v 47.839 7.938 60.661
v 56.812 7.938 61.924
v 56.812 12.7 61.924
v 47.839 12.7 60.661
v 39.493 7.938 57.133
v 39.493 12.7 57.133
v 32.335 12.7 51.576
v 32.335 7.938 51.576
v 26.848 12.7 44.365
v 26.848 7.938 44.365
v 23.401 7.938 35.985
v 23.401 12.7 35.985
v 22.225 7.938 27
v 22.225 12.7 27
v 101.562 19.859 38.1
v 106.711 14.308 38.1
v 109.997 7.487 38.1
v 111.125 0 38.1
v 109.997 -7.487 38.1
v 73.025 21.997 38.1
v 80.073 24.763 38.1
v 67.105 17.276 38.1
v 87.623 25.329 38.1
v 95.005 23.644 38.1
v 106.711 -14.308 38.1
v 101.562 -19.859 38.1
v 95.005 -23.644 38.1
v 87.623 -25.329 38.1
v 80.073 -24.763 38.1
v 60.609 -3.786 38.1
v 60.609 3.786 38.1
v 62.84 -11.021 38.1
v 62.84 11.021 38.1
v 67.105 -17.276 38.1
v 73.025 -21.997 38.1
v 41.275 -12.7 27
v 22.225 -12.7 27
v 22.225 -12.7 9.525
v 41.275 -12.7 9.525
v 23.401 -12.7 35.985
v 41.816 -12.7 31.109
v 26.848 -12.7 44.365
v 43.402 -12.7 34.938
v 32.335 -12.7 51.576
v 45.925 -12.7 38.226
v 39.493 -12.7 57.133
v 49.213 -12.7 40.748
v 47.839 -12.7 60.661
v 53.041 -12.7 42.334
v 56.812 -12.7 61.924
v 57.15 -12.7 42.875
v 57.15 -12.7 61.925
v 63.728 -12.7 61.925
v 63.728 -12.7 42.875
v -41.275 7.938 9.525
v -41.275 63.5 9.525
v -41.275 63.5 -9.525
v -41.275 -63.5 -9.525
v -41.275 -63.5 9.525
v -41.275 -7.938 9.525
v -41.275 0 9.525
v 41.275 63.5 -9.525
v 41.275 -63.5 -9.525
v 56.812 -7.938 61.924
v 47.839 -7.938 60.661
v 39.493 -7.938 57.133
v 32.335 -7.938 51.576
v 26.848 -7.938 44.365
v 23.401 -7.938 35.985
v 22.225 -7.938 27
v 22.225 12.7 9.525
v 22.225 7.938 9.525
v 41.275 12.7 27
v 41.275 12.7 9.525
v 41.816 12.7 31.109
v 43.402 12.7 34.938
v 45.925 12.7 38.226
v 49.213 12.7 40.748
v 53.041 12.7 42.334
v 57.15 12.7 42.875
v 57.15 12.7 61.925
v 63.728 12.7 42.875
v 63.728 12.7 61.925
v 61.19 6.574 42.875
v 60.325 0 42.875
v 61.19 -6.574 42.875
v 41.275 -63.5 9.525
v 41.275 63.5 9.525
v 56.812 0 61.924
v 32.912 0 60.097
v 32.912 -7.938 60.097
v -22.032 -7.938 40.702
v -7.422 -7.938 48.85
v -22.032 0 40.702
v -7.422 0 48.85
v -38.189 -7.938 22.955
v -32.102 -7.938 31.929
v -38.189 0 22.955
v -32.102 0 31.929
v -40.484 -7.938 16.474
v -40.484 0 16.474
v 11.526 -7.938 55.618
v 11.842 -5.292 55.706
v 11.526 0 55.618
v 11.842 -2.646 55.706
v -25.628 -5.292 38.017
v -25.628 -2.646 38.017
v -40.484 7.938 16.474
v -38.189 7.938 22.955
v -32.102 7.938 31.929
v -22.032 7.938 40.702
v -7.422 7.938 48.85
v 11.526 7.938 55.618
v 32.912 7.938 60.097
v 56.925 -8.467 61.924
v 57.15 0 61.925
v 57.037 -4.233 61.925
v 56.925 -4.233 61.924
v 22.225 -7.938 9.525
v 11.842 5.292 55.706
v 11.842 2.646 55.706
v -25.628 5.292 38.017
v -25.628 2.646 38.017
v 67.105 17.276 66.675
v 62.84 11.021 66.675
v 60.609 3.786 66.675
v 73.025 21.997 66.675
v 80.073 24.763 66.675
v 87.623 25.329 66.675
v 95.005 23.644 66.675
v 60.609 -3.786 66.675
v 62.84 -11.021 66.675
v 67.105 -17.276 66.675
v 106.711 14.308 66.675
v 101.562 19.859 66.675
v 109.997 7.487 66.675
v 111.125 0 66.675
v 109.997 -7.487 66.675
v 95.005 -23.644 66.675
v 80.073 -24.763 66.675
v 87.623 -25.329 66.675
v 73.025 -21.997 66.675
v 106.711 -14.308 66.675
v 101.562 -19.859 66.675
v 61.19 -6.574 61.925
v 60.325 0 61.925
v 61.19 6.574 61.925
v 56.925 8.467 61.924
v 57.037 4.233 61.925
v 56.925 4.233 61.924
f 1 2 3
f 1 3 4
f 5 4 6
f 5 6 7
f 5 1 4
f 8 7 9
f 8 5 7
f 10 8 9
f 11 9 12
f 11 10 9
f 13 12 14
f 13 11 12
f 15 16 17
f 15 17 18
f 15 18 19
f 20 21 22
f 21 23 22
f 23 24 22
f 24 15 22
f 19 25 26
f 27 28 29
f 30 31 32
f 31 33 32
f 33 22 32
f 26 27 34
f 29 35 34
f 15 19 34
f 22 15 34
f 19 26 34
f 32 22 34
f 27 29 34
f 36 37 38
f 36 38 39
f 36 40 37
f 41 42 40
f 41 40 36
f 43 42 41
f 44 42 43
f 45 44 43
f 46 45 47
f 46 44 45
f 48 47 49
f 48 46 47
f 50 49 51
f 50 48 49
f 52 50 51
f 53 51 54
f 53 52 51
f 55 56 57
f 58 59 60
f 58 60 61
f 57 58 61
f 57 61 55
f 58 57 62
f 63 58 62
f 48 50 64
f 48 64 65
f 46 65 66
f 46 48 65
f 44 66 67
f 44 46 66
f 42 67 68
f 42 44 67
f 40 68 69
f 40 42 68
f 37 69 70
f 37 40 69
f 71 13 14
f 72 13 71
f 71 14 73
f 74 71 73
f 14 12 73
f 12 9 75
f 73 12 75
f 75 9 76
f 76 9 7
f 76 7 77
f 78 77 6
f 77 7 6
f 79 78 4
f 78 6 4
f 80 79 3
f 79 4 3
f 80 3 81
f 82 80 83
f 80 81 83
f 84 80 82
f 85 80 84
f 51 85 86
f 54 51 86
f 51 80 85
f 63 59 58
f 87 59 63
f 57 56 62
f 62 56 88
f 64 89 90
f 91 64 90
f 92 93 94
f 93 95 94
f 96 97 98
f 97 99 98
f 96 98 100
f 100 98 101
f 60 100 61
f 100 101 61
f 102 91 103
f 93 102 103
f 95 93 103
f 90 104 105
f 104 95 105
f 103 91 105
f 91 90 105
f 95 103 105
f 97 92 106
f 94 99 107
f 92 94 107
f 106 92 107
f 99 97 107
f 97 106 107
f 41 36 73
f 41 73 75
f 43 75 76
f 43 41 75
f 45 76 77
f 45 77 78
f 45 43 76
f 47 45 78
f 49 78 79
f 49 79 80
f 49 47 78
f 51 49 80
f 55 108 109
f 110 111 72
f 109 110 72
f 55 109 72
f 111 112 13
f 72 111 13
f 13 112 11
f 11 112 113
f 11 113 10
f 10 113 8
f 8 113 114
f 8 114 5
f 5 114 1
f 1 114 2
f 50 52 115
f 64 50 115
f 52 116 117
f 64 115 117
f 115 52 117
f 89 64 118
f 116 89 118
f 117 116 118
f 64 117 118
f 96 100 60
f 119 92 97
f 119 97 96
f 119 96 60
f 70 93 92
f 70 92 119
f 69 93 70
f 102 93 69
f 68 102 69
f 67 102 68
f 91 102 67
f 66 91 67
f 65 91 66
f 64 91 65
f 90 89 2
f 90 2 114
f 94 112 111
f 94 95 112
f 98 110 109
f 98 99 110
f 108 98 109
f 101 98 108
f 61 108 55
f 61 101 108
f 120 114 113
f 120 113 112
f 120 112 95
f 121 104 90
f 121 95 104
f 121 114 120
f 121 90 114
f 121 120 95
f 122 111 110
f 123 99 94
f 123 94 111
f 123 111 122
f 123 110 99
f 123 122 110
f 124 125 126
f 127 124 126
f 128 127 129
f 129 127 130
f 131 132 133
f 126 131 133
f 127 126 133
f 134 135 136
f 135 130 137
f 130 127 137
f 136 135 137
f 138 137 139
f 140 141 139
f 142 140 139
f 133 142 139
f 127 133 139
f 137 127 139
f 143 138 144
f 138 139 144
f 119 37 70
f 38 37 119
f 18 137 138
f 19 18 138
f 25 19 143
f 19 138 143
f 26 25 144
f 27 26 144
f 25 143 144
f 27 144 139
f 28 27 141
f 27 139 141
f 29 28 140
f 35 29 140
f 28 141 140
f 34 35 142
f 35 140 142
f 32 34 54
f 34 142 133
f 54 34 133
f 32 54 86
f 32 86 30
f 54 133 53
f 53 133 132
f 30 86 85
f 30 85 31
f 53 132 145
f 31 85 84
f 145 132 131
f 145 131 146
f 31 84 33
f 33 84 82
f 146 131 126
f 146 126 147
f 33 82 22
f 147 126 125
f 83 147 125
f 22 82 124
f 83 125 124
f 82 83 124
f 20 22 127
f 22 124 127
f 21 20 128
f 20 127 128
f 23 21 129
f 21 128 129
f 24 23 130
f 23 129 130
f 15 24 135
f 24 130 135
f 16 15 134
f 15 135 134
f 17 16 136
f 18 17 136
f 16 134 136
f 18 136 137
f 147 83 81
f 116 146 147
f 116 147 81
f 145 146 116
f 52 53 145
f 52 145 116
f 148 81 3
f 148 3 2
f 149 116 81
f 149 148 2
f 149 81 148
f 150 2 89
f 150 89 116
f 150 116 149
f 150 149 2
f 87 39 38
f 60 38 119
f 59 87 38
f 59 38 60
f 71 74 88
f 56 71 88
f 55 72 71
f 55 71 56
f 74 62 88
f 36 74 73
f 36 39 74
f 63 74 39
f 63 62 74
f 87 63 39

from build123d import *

# Parameters (mm, degrees)
F1_DEPTH = 63.5
F0_W     = 25.4
F0_H     = 19.05
F2_DEPTH = 12.7
F3_DEPTH = 7.9375


with BuildPart() as f1:
    # F0 (on Front) → F1 (new body, symmetric)
    with BuildSketch(Plane.XZ):
        Polygon((41.275, -9.525), (41.275, 9.525), (22.225, 9.525), (-41.275, 9.525), (-41.275, -9.525), align=None)
    extrude(amount=F1_DEPTH, both=True)

    # F0 (on Front) → F2 (join, symmetric)
    with BuildSketch(Plane.XZ):
        with BuildLine():
            Line((22.225, 9.525), (41.275, 9.525))
            Line((41.275, 9.525), (41.275, 27.0002))
            ThreePointArc((41.275, 27.0002), (45.9246798487, 38.2255201513), (57.15, 42.8752))
            Line((57.15, 42.8752), (60.325, 42.8752))
            Line((60.325, 42.8752), (60.325, 61.9252))
            Line((60.325, 61.9252), (57.15, 61.9252))
            add(Edge.make_bspline(
                [(57.15, 61.9252), (57.0373941286, 61.9247746009), (56.9247198361, 61.9242293137), (56.8119782106, 61.9235641889)],
                knots=[0, 0, 0, 0, 0.2853238396, 0.2853238396, 0.2853238396, 0.2853238396], degree=3))
            ThreePointArc((56.8119782106, 61.9235641889), (32.3350746929, 51.5761050088), (22.225, 27.0002))
            Line((22.225, 27.0002), (22.225, 9.525))
        make_face()
        with Locations((73.025, 52.4002)):
            Rectangle(F0_W, F0_H)
    extrude(amount=F2_DEPTH, both=True)

    # F0 (on Front) → F3 (join, symmetric)
    with BuildSketch(Plane.XZ):
        with BuildLine():
            Line((-41.275, 9.525), (22.225, 9.525))
            Line((22.225, 9.525), (22.225, 27.0002))
            ThreePointArc((22.225, 27.0002), (32.3350746929, 51.5761050088), (56.8119782106, 61.9235641889))
            add(Edge.make_bspline(
                [(56.8119782106, 61.9235641889), (12.8653006287, 61.6642986017), (-41.3122228032, 43.1964478653), (-41.275, 9.525)],
                knots=[0.2853238396, 0.2853238396, 0.2853238396, 0.2853238396, 111.5045361635, 111.5045361635, 111.5045361635, 111.5045361635], degree=3))
        make_face()
    extrude(amount=F3_DEPTH, both=True)

    # F0 (on Front) → F4 (revolve)
    with BuildSketch(Plane.XZ):
        Polygon((85.725, 61.9252), (85.725, 42.8752), (85.725, 38.1), (111.125, 38.1), (111.125, 66.675), (85.725, 66.675), align=None)
    revolve(axis=Axis((85.725, 0, 52.3875), (0, 0, -1)))


solid = f1.part
